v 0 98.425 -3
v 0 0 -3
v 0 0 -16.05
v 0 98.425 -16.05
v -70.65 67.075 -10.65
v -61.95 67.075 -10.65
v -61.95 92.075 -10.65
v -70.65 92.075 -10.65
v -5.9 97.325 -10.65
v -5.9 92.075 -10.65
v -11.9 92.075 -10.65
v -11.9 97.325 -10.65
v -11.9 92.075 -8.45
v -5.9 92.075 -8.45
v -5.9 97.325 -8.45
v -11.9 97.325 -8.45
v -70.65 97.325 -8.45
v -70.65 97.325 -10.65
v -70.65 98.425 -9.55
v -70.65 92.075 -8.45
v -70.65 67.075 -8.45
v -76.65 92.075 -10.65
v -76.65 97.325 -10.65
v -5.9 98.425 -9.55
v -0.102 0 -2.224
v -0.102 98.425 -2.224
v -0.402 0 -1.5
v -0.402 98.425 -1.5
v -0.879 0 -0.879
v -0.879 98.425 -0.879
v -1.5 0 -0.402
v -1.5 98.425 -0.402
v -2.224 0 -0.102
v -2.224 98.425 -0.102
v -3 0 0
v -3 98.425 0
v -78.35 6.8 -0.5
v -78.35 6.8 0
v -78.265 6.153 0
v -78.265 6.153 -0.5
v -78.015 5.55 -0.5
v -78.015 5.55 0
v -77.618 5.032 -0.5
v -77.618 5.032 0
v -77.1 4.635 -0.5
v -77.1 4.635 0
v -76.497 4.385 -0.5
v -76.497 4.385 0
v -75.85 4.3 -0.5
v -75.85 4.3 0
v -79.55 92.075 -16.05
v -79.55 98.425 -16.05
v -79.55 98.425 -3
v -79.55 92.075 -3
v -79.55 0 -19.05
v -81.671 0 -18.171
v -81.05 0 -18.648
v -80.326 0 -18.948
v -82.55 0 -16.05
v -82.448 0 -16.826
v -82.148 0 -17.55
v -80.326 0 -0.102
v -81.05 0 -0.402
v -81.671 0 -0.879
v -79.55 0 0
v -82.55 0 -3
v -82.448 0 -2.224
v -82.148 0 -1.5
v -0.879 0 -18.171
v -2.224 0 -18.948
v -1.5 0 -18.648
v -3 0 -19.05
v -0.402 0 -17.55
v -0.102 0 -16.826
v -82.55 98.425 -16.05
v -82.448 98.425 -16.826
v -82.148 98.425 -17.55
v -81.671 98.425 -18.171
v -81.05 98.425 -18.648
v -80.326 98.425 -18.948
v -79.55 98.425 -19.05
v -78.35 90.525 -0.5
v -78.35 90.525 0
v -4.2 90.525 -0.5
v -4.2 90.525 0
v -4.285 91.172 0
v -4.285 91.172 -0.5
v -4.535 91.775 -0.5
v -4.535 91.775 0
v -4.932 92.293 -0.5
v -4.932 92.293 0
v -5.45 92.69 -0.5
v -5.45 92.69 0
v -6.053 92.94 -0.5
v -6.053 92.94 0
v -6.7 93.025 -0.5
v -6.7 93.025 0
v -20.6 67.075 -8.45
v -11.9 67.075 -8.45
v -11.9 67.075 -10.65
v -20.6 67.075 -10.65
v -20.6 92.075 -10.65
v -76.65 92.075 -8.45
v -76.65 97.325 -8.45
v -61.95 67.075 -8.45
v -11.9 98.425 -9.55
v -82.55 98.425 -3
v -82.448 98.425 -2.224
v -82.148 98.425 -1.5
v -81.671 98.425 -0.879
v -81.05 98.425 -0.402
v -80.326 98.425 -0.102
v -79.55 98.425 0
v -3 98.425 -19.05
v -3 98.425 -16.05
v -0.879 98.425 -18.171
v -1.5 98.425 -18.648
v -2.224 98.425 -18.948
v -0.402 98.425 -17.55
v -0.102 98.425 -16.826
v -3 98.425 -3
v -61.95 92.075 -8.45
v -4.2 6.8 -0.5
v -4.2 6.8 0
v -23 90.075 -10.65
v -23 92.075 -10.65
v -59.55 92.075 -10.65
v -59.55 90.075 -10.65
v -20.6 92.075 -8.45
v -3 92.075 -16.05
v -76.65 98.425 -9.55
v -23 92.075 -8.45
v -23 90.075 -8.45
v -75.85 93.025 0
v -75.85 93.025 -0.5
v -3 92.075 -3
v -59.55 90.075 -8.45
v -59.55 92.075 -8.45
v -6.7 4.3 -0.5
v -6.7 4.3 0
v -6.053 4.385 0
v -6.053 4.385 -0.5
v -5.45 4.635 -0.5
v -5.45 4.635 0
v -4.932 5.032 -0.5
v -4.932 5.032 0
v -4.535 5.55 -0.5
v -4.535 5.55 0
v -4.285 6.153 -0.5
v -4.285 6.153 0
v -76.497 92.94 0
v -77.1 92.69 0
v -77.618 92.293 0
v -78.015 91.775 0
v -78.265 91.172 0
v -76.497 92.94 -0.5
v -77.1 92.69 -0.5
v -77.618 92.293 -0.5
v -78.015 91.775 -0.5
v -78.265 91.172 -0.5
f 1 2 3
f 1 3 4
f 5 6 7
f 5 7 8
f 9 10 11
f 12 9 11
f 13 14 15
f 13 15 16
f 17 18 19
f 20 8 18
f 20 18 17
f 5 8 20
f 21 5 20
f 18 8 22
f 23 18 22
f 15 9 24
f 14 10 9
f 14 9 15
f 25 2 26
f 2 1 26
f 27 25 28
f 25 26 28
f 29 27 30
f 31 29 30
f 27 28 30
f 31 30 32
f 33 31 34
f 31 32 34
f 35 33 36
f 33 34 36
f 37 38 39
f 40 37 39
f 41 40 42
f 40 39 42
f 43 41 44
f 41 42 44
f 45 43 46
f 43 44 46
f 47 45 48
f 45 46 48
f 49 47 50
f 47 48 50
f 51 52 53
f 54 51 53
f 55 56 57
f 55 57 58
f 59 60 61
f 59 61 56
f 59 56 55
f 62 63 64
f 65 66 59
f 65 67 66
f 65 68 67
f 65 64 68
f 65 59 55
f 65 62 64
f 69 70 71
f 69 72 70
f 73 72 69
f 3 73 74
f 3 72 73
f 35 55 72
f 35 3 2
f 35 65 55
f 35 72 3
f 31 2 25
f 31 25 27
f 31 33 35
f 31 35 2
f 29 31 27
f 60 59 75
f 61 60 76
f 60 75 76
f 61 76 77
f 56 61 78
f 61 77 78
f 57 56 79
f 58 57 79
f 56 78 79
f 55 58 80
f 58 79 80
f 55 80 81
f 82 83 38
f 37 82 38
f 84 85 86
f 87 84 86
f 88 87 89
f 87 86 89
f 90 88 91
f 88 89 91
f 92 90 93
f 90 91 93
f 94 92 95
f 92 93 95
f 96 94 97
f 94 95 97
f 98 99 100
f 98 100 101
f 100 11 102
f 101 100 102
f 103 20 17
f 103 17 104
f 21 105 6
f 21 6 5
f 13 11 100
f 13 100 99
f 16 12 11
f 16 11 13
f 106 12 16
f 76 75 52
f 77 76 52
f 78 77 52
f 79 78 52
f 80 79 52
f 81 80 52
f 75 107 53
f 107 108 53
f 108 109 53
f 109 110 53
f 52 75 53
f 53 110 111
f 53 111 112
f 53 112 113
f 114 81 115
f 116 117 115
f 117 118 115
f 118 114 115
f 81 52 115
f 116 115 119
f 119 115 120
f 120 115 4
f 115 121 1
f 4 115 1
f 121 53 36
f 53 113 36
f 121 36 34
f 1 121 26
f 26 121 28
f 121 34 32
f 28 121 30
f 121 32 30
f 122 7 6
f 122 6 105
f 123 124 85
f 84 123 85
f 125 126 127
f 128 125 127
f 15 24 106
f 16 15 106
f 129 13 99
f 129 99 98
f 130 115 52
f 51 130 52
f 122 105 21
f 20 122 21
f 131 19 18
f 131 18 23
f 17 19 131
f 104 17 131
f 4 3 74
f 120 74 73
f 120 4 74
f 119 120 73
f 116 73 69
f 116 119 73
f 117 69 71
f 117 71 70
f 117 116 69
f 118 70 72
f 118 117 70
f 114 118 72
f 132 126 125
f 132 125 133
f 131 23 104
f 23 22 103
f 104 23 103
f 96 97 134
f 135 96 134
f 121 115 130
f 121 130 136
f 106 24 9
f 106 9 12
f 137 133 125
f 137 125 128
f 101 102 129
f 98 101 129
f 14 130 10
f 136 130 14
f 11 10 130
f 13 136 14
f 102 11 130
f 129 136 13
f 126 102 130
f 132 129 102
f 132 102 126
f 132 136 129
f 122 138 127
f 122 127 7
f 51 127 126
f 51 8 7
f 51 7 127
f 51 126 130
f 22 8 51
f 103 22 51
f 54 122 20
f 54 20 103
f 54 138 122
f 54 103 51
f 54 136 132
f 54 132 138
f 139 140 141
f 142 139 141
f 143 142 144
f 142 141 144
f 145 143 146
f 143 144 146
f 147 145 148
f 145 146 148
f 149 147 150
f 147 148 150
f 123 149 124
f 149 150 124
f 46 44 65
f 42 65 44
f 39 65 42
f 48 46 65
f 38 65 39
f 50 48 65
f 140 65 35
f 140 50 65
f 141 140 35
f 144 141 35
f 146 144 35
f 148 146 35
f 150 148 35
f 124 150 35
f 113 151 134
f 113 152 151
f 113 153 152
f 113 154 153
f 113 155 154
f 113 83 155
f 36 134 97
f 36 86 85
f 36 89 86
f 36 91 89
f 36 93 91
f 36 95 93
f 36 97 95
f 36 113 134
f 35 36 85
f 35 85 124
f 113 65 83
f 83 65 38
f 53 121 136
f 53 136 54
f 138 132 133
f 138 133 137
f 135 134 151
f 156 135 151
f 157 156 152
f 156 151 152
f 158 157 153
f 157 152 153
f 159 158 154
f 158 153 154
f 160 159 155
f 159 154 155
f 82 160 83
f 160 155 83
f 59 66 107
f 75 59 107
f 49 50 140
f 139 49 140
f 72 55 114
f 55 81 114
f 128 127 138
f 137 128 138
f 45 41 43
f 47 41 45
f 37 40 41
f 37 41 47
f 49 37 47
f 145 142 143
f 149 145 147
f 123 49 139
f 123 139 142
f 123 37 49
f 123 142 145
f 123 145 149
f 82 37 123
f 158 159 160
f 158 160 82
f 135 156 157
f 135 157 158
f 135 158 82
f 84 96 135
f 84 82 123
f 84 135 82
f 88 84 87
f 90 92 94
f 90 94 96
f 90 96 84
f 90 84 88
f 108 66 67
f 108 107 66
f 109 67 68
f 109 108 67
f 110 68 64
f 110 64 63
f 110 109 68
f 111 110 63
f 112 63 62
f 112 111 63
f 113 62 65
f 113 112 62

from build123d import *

# Parameters (mm, degrees)
F0_W      = 82.55
F0_H      = 98.425
F2_DEPTH  = 19.05
F3_R      = 3
F4_W      = 76.55
F4_H      = 13.05
F5_DEPTH  = 6.35
F6_W      = 36.55
F6_H      = 2.2
F7_DEPTH  = 2
F8_W      = 8.7
F8_H      = 2.2
F9_DEPTH  = 25
F10_W     = 6
F10_H     = 2.2
F11_DEPTH = 6.35
F12_SIZE  = 1.09999
F14_DEPTH = 0.5


# Not quite as in the source:
# - a fillet or chamfer is up to 0.001 mm smaller than in the source, because OpenCascade refuses the exact size


with BuildPart() as f2:
    # F0 (on Top) → F2 (new body)
    with BuildSketch(Plane.XY):
        with Locations((-41.275, 49.2125)):
            Rectangle(F0_W, F0_H)
    extrude(amount=-F2_DEPTH)

    # F3
    f3_edges = [f2.edges().sort_by_distance(p)[0] for p in [
        (-82.55, 49.2125, -19.05),
        (-82.55, 49.2125, 0),
        (0, 49.2125, 0),
        (0, 49.2125, -19.05),
    ]]
    fillet(f3_edges, radius=F3_R)

    # F4 (on face) → F5 (cut)
    with BuildSketch(Plane(origin=(0, 98.425, 0), x_dir=(-1, 0, 0), z_dir=(0, 1, 0))):
        with Locations((41.275, -9.525)):
            Rectangle(F4_W, F4_H)
    extrude(amount=-F5_DEPTH, mode=Mode.SUBTRACT)

    # F6 (on face) → F7 (cut)
    with BuildSketch(Plane(origin=(0, 92.075, 0), x_dir=(-1, 0, 0), z_dir=(0, 1, 0))):
        with Locations((41.275, -9.55)):
            Rectangle(F6_W, F6_H)
    extrude(amount=-F7_DEPTH, mode=Mode.SUBTRACT)

    # F8 (on face) → F9 (cut)
    with BuildSketch(Plane(origin=(0, 92.075, 0), x_dir=(-1, 0, 0), z_dir=(0, 1, 0))):
        with Locations((66.3, -9.55)):
            Rectangle(F8_W, F8_H)
        with Locations((16.25, -9.55)):
            Rectangle(F8_W, F8_H)
    extrude(amount=-F9_DEPTH, mode=Mode.SUBTRACT)

    # F10 (on face) → F11 (join, through all)
    with BuildSketch(Plane(origin=(0, 92.075, 0), x_dir=(-1, 0, 0), z_dir=(0, 1, 0))):
        with Locations((73.65, -9.55)):
            Rectangle(F10_W, F10_H)
        with Locations((8.9, -9.55)):
            Rectangle(F10_W, F10_H)
    extrude(amount=F11_DEPTH)

    # F12 (size 1.1 in the source; OpenCascade refuses exactly that, so slightly less here)
    f12_edges = [f2.edges().sort_by_distance(p)[0] for p in [
        (-8.9, 98.425, -8.45),
        (-8.9, 98.425, -10.65),
        (-73.65, 98.425, -8.45),
        (-73.65, 98.425, -10.65),
    ]]
    chamfer(f12_edges, length=F12_SIZE)

    # F13 (on face) → F14 (cut)
    with BuildSketch(Plane.XY):
        with BuildLine():
            Line((-6.7, 93.025), (-75.85, 93.025))
            ThreePointArc((-75.85, 93.025), (-77.617766953, 92.292766953), (-78.35, 90.525))
            Line((-78.35, 90.525), (-78.35, 6.8))
            ThreePointArc((-78.35, 6.8), (-77.617766953, 5.032233047), (-75.85, 4.3))
            Line((-75.85, 4.3), (-6.7, 4.3))
            ThreePointArc((-6.7, 4.3), (-4.932233047, 5.032233047), (-4.2, 6.8))
            Line((-4.2, 6.8), (-4.2, 90.525))
            ThreePointArc((-4.2, 90.525), (-4.932233047, 92.292766953), (-6.7, 93.025))
        make_face()
    extrude(amount=-F14_DEPTH, mode=Mode.SUBTRACT)


solid = f2.part
